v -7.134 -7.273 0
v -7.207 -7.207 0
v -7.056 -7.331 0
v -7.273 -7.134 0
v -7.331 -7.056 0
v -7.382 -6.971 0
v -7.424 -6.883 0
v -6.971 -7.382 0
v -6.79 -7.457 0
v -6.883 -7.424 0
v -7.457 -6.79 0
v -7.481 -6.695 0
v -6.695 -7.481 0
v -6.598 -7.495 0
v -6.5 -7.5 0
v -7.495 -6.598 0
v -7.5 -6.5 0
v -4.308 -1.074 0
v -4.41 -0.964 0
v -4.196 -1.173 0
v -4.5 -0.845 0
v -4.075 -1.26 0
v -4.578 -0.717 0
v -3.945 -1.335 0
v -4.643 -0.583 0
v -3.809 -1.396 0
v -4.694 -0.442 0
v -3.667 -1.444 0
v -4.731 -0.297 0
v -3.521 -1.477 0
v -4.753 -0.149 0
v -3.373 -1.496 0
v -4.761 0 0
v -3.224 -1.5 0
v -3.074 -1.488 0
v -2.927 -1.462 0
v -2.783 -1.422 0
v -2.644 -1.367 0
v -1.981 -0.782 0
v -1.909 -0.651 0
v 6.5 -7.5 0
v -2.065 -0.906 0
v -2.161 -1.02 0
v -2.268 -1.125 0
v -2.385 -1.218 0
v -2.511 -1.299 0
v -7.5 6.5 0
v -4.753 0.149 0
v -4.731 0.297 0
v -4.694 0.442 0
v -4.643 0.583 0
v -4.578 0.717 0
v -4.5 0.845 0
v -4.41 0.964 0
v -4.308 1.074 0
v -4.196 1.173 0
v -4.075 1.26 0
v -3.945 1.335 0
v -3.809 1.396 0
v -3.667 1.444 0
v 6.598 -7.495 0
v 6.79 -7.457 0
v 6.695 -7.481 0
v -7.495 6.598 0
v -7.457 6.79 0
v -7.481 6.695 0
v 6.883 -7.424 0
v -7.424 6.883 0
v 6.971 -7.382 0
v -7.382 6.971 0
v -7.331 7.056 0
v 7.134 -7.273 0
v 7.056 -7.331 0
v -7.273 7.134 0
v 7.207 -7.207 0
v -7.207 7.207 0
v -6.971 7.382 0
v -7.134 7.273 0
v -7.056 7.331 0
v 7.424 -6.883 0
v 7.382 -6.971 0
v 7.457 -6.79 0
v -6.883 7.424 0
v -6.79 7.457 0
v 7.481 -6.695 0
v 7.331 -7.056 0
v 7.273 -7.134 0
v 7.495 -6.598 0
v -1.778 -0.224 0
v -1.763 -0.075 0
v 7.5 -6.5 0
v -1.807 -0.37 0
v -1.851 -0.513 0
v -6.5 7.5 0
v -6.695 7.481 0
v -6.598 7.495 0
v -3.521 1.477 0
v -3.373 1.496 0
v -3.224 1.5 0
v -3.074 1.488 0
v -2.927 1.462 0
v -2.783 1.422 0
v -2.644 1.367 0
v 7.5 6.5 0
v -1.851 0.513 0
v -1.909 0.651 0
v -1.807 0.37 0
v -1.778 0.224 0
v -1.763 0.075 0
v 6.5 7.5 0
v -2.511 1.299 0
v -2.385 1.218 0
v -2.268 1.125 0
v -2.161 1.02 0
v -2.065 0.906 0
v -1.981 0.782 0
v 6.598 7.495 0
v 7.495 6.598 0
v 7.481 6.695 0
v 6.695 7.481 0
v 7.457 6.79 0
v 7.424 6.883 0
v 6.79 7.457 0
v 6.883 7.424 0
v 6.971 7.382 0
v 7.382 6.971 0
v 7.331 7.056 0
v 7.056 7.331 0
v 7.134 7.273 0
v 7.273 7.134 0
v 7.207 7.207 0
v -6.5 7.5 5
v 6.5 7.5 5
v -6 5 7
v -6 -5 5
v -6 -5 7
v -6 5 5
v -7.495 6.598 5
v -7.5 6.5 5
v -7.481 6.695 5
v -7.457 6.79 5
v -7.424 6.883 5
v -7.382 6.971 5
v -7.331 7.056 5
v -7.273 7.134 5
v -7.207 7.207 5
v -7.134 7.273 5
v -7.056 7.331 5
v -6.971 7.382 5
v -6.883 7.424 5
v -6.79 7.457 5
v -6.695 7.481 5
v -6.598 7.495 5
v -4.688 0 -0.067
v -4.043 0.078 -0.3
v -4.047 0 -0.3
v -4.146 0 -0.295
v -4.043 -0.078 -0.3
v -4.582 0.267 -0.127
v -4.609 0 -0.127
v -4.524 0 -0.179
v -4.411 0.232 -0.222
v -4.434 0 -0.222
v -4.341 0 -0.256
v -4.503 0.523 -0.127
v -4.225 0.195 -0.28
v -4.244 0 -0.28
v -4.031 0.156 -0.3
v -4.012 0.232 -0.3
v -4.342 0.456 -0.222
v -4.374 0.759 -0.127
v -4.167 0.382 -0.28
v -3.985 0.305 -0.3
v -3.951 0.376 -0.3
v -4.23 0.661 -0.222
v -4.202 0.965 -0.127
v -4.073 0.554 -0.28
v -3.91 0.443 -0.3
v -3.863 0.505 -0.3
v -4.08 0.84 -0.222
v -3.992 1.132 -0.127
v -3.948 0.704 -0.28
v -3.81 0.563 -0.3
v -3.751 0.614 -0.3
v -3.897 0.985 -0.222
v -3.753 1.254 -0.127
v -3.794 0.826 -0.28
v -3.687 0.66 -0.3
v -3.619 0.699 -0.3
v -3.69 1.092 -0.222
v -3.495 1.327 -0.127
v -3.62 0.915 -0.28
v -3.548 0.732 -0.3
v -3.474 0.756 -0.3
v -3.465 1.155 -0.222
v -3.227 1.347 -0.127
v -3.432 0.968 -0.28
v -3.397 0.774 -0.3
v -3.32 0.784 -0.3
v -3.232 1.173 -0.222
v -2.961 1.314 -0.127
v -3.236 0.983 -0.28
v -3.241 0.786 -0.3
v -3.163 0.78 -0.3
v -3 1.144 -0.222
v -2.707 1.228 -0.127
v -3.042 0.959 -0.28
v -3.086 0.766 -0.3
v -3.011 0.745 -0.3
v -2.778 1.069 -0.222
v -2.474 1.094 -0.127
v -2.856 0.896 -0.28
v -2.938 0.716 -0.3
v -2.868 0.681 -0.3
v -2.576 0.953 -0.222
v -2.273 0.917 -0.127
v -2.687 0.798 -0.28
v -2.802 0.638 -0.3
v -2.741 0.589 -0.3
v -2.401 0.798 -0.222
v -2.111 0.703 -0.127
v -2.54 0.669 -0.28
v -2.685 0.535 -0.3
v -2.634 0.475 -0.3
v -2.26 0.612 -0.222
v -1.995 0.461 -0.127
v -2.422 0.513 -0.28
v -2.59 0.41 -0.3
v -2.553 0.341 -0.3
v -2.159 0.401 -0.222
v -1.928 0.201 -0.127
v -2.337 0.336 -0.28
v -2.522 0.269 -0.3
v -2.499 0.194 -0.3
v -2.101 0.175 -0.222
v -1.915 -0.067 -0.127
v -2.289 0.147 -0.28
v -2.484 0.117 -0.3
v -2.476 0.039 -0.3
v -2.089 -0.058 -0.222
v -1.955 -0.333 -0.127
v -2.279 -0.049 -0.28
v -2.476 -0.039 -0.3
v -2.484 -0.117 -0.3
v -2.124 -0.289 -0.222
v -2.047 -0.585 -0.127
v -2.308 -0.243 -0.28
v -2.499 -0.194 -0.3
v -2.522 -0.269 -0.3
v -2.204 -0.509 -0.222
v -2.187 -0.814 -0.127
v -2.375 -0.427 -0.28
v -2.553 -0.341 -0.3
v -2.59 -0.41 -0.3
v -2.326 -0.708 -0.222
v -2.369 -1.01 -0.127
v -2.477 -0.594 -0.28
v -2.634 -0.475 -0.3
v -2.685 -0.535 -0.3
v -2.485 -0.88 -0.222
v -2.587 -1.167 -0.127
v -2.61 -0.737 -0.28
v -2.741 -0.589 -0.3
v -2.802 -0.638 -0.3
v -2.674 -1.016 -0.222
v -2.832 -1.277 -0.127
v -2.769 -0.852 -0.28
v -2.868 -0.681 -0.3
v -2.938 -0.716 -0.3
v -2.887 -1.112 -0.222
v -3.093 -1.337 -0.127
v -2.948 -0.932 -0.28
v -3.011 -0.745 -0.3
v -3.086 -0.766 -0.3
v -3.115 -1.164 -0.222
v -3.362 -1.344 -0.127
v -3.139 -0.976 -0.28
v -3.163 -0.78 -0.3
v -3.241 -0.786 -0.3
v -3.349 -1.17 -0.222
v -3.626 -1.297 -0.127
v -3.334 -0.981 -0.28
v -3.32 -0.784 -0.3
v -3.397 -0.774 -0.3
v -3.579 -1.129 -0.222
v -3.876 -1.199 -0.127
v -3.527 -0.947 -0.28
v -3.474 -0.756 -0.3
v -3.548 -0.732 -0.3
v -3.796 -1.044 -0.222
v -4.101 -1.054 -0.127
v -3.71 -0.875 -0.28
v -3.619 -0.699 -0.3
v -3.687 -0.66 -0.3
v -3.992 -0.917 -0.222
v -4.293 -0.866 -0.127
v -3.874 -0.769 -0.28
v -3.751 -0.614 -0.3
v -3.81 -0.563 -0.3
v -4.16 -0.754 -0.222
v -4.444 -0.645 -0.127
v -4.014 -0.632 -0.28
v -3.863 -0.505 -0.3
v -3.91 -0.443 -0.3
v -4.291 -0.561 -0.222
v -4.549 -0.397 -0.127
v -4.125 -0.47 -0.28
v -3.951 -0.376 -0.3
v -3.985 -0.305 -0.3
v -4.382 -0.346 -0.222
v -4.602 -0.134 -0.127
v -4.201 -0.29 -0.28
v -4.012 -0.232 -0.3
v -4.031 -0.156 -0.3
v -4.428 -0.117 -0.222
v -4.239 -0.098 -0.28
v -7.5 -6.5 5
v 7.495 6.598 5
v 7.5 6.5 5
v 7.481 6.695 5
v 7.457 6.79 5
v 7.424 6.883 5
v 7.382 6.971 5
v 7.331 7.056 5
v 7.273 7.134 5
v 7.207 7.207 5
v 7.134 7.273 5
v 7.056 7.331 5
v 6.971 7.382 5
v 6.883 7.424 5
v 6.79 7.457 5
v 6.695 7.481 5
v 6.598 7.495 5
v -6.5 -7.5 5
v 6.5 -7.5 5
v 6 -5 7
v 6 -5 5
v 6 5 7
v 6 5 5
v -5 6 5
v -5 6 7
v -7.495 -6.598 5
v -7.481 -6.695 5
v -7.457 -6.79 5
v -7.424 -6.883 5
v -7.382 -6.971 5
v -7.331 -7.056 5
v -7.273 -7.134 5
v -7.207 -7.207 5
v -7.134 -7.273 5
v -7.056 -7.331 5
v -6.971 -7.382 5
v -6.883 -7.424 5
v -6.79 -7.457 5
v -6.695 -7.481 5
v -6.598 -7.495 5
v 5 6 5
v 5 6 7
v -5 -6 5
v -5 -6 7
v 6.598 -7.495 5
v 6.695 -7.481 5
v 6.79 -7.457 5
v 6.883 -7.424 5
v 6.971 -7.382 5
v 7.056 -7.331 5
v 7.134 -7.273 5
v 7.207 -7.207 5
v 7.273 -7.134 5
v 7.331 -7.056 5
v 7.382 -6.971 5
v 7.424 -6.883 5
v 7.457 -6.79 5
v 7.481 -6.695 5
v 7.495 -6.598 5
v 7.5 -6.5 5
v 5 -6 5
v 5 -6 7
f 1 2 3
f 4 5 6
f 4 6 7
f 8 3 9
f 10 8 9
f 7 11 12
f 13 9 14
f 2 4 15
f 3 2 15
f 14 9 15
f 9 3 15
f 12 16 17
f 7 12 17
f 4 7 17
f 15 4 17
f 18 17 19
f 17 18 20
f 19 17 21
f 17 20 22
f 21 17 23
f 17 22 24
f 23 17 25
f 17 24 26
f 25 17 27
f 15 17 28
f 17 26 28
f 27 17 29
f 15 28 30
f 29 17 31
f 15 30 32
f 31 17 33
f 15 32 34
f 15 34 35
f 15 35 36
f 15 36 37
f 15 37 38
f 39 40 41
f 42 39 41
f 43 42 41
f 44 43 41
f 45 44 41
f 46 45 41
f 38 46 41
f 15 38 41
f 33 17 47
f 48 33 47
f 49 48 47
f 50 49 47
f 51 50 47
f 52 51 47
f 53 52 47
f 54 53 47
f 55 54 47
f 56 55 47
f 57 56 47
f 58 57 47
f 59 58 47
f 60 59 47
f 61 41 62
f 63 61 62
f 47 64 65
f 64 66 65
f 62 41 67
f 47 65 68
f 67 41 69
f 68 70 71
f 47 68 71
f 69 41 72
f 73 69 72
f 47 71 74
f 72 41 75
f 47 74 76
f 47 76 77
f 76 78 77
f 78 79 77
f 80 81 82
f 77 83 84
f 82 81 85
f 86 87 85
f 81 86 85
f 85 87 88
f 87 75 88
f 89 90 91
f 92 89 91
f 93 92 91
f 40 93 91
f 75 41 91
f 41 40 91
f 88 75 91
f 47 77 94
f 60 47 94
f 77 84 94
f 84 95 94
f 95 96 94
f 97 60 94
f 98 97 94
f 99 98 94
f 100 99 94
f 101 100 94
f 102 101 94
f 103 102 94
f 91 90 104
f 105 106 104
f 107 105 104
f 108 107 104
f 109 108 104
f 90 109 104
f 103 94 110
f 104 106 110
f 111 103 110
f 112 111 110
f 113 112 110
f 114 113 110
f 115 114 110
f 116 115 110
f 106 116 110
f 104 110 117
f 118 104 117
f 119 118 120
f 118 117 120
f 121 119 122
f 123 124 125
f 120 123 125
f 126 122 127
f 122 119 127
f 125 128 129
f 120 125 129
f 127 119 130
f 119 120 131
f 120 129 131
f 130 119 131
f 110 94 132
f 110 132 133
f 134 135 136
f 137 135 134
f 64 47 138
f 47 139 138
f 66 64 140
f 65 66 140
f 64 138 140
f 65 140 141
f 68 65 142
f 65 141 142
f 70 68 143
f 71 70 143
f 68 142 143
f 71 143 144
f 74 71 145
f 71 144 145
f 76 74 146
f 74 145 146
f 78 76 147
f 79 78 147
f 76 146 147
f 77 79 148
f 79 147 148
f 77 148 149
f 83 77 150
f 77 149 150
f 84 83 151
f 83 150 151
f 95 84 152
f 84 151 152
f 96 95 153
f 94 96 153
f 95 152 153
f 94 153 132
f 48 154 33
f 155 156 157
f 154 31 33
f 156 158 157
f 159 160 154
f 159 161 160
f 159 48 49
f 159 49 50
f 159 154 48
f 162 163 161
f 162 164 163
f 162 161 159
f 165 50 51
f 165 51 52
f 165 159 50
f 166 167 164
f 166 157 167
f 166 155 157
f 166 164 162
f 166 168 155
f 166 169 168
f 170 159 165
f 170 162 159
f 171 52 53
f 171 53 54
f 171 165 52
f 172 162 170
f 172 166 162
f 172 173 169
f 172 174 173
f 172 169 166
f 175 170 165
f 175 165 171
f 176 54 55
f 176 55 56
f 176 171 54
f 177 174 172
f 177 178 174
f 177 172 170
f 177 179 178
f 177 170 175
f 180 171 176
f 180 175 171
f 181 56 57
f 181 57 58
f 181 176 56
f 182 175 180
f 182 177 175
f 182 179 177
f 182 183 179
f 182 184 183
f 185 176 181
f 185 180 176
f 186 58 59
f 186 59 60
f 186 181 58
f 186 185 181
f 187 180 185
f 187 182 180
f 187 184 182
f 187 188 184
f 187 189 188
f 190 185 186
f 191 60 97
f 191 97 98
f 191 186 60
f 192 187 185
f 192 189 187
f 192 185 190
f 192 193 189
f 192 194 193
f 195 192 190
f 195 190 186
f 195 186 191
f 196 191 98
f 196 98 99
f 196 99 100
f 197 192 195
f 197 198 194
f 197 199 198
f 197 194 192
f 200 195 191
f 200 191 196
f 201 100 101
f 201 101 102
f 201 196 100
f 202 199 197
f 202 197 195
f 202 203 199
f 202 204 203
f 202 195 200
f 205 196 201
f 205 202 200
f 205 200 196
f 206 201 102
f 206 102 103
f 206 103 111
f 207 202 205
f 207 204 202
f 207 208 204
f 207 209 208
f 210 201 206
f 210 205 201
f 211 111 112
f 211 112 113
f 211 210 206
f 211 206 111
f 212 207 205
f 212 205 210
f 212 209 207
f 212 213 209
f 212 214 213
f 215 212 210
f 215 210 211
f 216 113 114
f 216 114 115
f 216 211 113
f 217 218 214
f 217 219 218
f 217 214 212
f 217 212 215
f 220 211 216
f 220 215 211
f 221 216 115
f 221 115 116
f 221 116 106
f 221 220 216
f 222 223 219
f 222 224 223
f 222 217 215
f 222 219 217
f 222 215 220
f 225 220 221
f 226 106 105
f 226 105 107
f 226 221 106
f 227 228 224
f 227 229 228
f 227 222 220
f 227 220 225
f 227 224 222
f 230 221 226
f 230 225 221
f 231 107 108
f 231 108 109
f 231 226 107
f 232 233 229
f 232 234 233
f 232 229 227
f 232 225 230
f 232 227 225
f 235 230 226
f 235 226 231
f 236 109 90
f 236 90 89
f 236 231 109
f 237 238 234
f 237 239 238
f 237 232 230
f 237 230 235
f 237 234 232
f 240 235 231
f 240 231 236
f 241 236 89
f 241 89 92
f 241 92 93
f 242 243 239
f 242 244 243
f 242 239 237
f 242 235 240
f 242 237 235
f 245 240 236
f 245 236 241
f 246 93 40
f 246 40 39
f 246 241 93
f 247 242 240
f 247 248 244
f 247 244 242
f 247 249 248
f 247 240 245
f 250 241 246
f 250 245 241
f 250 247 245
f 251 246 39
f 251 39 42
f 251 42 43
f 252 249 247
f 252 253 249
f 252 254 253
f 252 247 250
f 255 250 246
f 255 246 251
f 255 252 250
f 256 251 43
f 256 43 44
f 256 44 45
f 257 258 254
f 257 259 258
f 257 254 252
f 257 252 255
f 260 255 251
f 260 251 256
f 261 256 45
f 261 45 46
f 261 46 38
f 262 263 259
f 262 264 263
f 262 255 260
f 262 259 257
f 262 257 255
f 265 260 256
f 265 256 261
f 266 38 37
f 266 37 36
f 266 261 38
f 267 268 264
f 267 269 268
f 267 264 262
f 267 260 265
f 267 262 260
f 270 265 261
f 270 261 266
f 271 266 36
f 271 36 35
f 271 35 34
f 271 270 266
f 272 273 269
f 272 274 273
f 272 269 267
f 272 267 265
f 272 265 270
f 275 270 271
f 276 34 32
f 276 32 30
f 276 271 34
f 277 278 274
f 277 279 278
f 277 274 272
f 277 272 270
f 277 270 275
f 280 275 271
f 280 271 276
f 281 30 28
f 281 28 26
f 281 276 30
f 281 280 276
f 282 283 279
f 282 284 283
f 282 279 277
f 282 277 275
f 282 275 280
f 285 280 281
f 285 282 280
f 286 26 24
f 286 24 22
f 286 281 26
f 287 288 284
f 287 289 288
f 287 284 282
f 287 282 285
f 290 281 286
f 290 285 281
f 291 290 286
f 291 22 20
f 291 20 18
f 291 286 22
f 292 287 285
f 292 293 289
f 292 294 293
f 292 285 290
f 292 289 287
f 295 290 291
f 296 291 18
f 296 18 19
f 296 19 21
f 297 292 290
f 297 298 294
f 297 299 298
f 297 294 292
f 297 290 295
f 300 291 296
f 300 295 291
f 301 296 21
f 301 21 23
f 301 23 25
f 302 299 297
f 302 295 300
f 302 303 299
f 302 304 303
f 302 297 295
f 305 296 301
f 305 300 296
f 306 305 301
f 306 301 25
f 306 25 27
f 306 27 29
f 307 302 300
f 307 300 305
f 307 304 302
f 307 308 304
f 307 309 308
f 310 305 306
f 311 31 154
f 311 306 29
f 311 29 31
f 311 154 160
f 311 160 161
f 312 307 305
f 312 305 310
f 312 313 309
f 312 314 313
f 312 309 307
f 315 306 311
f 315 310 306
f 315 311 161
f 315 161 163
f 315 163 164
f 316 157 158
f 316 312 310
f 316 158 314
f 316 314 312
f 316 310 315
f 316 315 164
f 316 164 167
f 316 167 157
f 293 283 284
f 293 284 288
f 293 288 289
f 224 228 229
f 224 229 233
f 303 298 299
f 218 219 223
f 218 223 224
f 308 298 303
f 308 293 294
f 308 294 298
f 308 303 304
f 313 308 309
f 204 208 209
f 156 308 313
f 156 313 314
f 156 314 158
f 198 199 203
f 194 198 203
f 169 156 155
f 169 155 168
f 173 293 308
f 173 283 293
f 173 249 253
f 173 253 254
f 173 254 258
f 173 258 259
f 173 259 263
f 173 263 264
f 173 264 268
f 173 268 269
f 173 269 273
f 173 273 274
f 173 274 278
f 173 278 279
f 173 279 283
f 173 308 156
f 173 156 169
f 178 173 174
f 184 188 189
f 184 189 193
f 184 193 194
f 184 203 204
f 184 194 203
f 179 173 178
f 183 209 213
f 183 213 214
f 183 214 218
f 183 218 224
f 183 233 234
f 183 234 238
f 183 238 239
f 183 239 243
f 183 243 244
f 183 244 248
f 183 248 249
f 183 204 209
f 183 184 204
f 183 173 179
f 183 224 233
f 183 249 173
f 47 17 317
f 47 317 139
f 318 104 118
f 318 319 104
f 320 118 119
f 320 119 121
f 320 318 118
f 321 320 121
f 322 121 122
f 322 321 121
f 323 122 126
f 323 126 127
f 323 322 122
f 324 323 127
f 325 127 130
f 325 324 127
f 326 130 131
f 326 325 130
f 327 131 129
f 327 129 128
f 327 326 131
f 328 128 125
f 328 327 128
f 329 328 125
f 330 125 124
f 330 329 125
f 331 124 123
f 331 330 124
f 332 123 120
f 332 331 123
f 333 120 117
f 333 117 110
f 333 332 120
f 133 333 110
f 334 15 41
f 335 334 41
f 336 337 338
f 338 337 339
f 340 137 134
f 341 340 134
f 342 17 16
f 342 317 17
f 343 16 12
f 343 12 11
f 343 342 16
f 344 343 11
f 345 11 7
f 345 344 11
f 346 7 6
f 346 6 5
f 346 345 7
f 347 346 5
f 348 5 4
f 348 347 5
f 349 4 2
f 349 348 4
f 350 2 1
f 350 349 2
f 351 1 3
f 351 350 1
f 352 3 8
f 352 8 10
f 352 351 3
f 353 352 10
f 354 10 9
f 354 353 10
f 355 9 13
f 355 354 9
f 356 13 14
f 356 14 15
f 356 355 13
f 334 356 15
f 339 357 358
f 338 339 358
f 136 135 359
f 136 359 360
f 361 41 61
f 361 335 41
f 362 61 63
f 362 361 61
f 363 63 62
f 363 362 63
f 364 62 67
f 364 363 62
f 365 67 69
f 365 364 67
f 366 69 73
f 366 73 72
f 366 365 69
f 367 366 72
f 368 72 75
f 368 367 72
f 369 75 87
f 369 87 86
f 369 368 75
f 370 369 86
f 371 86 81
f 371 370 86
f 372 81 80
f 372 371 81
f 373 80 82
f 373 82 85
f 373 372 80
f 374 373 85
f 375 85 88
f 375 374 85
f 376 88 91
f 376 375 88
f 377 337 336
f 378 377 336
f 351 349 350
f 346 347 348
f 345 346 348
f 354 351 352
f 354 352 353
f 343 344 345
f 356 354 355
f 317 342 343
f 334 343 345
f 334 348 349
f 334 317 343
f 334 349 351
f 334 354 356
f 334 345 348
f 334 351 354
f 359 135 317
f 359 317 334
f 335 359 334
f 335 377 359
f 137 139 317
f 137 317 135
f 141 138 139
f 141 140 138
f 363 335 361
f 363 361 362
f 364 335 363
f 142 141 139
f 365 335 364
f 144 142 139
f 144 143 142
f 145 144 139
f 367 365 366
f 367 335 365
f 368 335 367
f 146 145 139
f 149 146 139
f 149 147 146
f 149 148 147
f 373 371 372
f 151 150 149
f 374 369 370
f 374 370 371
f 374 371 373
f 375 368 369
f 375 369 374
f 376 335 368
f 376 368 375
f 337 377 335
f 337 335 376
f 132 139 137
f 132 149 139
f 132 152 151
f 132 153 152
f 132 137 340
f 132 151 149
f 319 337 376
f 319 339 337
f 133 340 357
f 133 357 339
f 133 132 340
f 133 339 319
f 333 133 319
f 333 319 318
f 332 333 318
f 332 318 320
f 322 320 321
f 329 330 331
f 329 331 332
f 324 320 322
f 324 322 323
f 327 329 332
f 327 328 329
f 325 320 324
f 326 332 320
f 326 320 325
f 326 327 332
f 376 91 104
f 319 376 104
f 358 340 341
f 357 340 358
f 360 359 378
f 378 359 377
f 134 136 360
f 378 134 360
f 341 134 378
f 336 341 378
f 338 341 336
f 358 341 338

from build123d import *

# Parameters (mm, degrees)
ESQUISSE1_W        = 15
ESQUISSE1_H        = 15
BOSS_EXTRU_1_DEPTH = 5
CONG_1_R           = 1
ESQUISSE2_R        = 1.5
BOSS_EXTRU_2_DEPTH = 0.3
CONG_2_R           = 1
ESQUISSE4_W        = 12
ESQUISSE4_H        = 12
BOSS_EXTRU_4_DEPTH = 2
CHANFREIN1_SIZE    = 1


with BuildPart() as part:
    # Esquisse1 → Boss.-Extru.1 (new body)
    with BuildSketch(Plane.XY):
        Rectangle(ESQUISSE1_W, ESQUISSE1_H)
    extrude(amount=BOSS_EXTRU_1_DEPTH)

    # Congé1
    cong_1_edges = [part.edges().sort_by_distance(p)[0] for p in [
        (7.5, -7.5, 2.5),
        (-7.5, -7.5, 2.5),
        (-7.5, 7.5, 2.5),
        (7.5, 7.5, 2.5),
    ]]
    fillet(cong_1_edges, radius=CONG_1_R)

    # Esquisse2 → Boss.-Extru.2 (add)
    with BuildSketch(Plane(origin=(0, 0, 0), x_dir=(-1, 0, 0), z_dir=(0, 0, -1))):
        with Locations((3.260921735, 0)):
            Circle(ESQUISSE2_R)
    extrude(amount=BOSS_EXTRU_2_DEPTH)

    # Congé2
    # the kernel refuses this fillet: 1 mm, written as the material it takes off along each edge
    with BuildSketch(Plane(origin=(-3.260921735, 0, -0.3), x_dir=(-1, 0, 0), z_dir=(0, -1, 0))) as cong_2_piece_1:
        with BuildLine():
            CenterArc((0.785857157, -1), CONG_2_R, 44.427004001, 45.572995999)
            Line((0.785857157, 0), (0.785857157, 0.02))
            Line((0.785857157, 0.02), (1.5, 0.02))
            Line((1.5, 0.02), (1.52, 0))
            ThreePointArc((1.52, 0), (1.52, -0.15), (1.514282857, -0.286))
            Line((1.514282857, -0.286), (1.5, -0.3))
        make_face()
    revolve(axis=Axis((-3.260921735, 0, -0.3), (0, 0, -1)), mode=Mode.SUBTRACT)

    # Esquisse4 → Boss.-Extru.4 (add)
    with BuildSketch(Plane.XY.offset(5)):
        Rectangle(ESQUISSE4_W, ESQUISSE4_H)
    extrude(amount=BOSS_EXTRU_4_DEPTH)

    # Chanfrein1
    chanfrein1_edges = [part.edges().sort_by_distance(p)[0] for p in [
        (6, -6, 6),
        (6, 6, 6),
        (-6, 6, 6),
        (-6, -6, 6),
    ]]
    chamfer(chanfrein1_edges, length=CHANFREIN1_SIZE)


solid = part.part
